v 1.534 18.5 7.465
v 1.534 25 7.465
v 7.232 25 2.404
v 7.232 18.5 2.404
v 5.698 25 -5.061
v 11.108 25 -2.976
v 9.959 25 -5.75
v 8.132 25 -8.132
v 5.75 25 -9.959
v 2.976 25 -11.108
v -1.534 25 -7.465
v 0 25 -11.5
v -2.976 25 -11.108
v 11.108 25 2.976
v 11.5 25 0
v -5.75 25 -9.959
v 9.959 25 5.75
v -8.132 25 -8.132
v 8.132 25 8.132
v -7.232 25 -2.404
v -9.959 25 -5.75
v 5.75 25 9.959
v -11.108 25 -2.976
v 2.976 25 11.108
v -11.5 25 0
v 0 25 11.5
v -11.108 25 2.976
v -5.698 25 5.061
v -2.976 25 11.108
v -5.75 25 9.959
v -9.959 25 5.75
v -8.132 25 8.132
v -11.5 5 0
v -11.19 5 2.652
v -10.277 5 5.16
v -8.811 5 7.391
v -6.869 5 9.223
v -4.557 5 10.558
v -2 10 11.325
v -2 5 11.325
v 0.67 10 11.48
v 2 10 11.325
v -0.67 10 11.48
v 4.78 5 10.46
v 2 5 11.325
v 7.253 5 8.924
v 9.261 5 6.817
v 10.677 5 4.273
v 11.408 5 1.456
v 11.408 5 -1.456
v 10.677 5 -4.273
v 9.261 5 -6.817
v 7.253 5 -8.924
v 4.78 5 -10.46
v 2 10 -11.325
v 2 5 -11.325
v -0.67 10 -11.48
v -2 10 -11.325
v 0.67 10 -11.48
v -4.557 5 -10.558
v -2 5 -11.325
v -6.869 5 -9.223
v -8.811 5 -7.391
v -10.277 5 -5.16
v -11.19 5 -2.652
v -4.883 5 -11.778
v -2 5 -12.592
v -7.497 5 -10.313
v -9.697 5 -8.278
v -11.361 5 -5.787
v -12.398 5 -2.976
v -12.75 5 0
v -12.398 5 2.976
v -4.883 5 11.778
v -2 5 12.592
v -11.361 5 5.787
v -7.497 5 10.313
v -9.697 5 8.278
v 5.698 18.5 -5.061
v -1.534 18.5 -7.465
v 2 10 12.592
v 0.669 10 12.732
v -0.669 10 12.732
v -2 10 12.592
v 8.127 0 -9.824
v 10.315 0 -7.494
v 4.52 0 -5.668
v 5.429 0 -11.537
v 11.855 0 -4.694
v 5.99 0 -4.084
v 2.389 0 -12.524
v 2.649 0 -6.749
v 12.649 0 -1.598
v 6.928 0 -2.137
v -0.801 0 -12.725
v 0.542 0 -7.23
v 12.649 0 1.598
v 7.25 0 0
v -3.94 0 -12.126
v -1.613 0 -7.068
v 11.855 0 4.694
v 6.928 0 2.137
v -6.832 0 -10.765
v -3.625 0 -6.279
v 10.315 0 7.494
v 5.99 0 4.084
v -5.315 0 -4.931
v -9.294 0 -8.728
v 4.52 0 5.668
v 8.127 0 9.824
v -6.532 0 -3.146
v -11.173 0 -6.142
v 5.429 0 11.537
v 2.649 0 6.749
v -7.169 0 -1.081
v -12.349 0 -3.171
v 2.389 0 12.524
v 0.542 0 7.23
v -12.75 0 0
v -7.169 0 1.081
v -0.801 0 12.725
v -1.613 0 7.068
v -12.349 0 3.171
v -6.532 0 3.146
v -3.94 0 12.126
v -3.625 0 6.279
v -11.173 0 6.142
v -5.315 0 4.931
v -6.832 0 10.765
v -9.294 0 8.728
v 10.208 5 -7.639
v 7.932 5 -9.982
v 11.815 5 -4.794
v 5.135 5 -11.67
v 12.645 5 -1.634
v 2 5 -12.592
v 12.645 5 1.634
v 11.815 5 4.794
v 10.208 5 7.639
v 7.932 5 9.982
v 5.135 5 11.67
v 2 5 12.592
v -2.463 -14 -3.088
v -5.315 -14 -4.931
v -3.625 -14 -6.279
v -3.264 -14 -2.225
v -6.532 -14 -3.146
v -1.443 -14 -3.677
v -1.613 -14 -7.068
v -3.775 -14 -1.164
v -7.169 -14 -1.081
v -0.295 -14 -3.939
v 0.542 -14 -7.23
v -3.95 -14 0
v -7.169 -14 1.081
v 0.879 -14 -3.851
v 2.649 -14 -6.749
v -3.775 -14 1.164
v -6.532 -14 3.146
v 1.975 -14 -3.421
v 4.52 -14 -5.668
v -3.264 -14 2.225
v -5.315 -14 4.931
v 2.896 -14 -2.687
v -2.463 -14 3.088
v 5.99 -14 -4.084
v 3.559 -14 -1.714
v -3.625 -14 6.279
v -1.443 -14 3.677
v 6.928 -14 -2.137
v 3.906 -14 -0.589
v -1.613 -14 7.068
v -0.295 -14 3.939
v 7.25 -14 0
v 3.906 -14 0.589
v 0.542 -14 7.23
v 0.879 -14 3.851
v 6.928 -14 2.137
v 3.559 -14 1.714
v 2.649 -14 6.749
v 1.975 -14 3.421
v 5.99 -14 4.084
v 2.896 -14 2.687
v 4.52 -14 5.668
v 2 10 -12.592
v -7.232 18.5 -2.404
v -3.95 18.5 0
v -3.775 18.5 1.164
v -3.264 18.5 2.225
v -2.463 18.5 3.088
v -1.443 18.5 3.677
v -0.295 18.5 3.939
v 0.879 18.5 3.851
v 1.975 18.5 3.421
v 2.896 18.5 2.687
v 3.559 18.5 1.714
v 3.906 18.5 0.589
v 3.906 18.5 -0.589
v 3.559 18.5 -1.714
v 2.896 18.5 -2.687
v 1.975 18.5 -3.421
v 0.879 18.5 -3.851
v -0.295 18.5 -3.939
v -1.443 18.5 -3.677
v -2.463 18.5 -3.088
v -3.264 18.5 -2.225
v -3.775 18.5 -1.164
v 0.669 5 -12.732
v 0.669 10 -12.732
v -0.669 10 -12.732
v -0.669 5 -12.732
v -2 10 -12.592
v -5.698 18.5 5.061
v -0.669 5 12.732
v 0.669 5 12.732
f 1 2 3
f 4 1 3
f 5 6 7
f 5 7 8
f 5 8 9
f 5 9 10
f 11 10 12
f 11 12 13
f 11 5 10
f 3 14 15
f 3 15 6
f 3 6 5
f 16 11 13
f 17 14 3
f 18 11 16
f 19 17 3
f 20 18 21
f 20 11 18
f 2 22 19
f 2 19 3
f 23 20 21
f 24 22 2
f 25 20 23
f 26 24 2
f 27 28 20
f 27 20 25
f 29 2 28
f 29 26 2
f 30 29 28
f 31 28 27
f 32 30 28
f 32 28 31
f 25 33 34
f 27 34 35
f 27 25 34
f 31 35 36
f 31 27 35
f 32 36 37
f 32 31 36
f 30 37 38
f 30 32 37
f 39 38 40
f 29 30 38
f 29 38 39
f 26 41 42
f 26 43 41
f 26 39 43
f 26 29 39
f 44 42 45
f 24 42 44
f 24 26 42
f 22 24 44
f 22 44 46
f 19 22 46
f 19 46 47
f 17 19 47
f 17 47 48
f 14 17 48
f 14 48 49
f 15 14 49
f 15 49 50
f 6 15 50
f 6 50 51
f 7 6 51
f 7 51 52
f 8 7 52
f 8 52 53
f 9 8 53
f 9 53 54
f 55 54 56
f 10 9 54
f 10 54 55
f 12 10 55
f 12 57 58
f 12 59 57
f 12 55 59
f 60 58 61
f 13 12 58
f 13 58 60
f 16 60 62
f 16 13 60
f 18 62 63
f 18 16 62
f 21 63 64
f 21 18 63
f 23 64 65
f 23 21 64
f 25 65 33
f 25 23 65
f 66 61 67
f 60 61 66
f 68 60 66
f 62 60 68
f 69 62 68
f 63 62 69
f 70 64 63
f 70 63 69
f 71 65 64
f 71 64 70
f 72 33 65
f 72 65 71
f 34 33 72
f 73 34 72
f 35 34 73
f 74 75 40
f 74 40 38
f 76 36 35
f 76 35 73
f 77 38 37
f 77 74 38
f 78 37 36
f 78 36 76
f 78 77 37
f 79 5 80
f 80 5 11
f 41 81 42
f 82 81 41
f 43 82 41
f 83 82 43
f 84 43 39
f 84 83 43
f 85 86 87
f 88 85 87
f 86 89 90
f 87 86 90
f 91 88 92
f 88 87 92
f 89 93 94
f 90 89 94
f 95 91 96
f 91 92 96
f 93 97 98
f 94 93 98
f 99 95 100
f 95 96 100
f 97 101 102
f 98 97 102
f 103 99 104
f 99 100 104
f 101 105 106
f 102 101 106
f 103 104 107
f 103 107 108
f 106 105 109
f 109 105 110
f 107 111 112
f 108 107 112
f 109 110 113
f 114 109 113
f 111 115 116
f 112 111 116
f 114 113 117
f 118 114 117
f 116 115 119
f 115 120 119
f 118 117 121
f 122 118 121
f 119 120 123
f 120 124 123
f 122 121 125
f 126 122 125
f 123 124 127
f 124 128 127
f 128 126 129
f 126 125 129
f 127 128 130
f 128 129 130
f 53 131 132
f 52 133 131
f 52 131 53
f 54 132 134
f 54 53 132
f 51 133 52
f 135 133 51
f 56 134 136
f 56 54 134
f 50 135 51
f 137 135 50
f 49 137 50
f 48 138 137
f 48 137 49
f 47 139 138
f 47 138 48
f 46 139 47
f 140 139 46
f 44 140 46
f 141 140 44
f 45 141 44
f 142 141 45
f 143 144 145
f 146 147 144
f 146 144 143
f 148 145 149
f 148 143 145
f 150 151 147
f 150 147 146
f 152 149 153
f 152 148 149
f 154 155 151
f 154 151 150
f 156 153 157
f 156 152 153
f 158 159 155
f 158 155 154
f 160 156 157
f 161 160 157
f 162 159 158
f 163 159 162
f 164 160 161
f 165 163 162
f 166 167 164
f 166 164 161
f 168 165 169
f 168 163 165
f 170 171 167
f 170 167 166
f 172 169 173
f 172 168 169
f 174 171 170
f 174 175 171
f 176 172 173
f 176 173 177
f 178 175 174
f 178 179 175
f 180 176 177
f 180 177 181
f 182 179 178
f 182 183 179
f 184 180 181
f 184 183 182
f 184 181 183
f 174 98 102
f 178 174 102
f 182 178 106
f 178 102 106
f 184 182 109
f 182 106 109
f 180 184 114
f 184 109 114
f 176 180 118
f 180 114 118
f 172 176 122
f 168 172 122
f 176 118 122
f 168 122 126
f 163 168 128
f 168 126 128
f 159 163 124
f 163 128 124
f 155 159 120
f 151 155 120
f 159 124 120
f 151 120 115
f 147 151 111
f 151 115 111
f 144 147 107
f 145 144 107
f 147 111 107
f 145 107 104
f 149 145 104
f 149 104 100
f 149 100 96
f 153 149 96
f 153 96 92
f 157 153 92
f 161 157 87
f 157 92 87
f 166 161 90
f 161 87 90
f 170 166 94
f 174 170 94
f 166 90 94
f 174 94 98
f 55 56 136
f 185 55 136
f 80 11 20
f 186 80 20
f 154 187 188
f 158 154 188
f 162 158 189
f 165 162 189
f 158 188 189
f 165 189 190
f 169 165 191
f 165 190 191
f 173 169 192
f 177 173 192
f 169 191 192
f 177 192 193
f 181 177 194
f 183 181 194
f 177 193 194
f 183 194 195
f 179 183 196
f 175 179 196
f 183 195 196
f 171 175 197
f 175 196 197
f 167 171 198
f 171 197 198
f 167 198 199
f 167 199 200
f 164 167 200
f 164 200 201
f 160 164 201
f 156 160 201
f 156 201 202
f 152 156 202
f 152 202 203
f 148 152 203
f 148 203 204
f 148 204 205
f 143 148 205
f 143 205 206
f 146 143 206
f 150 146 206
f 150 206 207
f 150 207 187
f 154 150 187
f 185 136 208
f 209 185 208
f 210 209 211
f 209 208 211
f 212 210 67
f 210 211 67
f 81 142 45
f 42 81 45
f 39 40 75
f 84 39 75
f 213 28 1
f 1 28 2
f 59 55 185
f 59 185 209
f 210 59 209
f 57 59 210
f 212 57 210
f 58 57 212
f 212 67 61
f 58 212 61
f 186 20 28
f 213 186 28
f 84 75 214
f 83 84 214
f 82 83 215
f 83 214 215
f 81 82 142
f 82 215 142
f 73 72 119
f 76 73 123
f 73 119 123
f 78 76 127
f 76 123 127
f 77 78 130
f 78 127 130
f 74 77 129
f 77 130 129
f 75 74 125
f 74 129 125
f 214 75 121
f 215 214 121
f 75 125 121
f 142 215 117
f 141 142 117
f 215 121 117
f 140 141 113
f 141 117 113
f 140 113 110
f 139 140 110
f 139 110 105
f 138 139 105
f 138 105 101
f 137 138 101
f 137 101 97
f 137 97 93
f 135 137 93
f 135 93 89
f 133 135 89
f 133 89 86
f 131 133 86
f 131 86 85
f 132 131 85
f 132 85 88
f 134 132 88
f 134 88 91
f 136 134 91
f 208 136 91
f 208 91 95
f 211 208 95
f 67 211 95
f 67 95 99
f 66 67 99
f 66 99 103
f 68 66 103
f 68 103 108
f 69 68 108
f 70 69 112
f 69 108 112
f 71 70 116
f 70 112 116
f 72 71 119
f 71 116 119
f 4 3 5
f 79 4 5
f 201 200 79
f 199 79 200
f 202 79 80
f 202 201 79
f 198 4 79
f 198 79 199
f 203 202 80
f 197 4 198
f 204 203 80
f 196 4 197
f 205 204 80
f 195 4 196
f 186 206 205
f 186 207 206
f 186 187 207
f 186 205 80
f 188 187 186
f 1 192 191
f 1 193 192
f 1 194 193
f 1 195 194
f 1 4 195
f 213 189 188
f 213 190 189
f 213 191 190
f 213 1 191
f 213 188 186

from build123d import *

# Parameters (mm, degrees)
F0_R      = 7.25
F1_DEPTH  = 14
F3_R      = 3
F4_DEPTH  = 14.001
F6_R      = 12.75
F7_DEPTH  = 25
F8_R      = 3.95
F9_DEPTH  = 39.001
F10_R     = 12.75
F10_R_2   = 11.5
F11_DEPTH = 20
F13_DEPTH = 5
F14_R     = 3.95
F15_DEPTH = 6.5


with BuildPart() as f1:
    # F0 (on Front) → F1 (new body)
    with BuildSketch(Plane.XZ):
        Circle(F0_R)
    extrude(amount=F1_DEPTH)

    # F3 (on face) → F4 (cut, through all)
    with BuildSketch(Plane.XZ.offset(14)):
        Circle(F3_R)
    extrude(amount=-F4_DEPTH, mode=Mode.SUBTRACT)

    # F6 (on offset) → F7 (join)
    with BuildSketch(Plane(origin=(0, 0, 0), x_dir=(-1, 0, 0), z_dir=(0, 1, 0))):
        Circle(F6_R)
    extrude(amount=F7_DEPTH)

    # F8 (on face) → F9 (cut, through all)
    with BuildSketch(Plane(origin=(0, 25, 0), x_dir=(-1, 0, 0), z_dir=(0, 1, 0))):
        Circle(F8_R)
    extrude(amount=-F9_DEPTH, mode=Mode.SUBTRACT)

    # F10 (on face) → F11 (cut)
    with BuildSketch(Plane(origin=(0, 25, 0), x_dir=(-1, 0, 0), z_dir=(0, 1, 0))):
        Circle(F10_R)
        Circle(F10_R_2, mode=Mode.SUBTRACT)
    extrude(amount=-F11_DEPTH, mode=Mode.SUBTRACT)

    # F12 (on face) → F13 (join)
    with BuildSketch(Plane(origin=(0, 5, 0), x_dir=(-1, 0, 0), z_dir=(0, 1, 0))):
        with BuildLine():
            ThreePointArc((2, 12.5921602595), (0, 12.75), (-2, 12.5921602595))
            Line((-2, 12.5921602595), (-2, 11.3247516529))
            ThreePointArc((-2, 11.3247516529), (0, 11.5), (2, 11.3247516529))
            Line((2, 11.3247516529), (2, 12.5921602595))
        make_face()
        with BuildLine():
            Line((-2, -11.3247516529), (-2, -12.5921602595))
            ThreePointArc((-2, -12.5921602595), (0, -12.75), (2, -12.5921602595))
            Line((2, -12.5921602595), (2, -11.3247516529))
            ThreePointArc((2, -11.3247516529), (0, -11.5), (-2, -11.3247516529))
        make_face()
    extrude(amount=F13_DEPTH)

    # F14 (on face) → F15 (cut)
    with BuildSketch(Plane(origin=(0, 25, 0), x_dir=(-1, 0, 0), z_dir=(0, 1, 0))):
        Polygon((5.6975970229, 5.0613622835), (-1.5344698039, 7.4649449041), (-7.2320668267, 2.4035826206), (-5.6975970229, -5.0613622835), (1.5344698039, -7.4649449041), (7.2320668267, -2.4035826206), align=None)
        Circle(F14_R, mode=Mode.SUBTRACT)
    extrude(amount=-F15_DEPTH, mode=Mode.SUBTRACT)


solid = f1.part
